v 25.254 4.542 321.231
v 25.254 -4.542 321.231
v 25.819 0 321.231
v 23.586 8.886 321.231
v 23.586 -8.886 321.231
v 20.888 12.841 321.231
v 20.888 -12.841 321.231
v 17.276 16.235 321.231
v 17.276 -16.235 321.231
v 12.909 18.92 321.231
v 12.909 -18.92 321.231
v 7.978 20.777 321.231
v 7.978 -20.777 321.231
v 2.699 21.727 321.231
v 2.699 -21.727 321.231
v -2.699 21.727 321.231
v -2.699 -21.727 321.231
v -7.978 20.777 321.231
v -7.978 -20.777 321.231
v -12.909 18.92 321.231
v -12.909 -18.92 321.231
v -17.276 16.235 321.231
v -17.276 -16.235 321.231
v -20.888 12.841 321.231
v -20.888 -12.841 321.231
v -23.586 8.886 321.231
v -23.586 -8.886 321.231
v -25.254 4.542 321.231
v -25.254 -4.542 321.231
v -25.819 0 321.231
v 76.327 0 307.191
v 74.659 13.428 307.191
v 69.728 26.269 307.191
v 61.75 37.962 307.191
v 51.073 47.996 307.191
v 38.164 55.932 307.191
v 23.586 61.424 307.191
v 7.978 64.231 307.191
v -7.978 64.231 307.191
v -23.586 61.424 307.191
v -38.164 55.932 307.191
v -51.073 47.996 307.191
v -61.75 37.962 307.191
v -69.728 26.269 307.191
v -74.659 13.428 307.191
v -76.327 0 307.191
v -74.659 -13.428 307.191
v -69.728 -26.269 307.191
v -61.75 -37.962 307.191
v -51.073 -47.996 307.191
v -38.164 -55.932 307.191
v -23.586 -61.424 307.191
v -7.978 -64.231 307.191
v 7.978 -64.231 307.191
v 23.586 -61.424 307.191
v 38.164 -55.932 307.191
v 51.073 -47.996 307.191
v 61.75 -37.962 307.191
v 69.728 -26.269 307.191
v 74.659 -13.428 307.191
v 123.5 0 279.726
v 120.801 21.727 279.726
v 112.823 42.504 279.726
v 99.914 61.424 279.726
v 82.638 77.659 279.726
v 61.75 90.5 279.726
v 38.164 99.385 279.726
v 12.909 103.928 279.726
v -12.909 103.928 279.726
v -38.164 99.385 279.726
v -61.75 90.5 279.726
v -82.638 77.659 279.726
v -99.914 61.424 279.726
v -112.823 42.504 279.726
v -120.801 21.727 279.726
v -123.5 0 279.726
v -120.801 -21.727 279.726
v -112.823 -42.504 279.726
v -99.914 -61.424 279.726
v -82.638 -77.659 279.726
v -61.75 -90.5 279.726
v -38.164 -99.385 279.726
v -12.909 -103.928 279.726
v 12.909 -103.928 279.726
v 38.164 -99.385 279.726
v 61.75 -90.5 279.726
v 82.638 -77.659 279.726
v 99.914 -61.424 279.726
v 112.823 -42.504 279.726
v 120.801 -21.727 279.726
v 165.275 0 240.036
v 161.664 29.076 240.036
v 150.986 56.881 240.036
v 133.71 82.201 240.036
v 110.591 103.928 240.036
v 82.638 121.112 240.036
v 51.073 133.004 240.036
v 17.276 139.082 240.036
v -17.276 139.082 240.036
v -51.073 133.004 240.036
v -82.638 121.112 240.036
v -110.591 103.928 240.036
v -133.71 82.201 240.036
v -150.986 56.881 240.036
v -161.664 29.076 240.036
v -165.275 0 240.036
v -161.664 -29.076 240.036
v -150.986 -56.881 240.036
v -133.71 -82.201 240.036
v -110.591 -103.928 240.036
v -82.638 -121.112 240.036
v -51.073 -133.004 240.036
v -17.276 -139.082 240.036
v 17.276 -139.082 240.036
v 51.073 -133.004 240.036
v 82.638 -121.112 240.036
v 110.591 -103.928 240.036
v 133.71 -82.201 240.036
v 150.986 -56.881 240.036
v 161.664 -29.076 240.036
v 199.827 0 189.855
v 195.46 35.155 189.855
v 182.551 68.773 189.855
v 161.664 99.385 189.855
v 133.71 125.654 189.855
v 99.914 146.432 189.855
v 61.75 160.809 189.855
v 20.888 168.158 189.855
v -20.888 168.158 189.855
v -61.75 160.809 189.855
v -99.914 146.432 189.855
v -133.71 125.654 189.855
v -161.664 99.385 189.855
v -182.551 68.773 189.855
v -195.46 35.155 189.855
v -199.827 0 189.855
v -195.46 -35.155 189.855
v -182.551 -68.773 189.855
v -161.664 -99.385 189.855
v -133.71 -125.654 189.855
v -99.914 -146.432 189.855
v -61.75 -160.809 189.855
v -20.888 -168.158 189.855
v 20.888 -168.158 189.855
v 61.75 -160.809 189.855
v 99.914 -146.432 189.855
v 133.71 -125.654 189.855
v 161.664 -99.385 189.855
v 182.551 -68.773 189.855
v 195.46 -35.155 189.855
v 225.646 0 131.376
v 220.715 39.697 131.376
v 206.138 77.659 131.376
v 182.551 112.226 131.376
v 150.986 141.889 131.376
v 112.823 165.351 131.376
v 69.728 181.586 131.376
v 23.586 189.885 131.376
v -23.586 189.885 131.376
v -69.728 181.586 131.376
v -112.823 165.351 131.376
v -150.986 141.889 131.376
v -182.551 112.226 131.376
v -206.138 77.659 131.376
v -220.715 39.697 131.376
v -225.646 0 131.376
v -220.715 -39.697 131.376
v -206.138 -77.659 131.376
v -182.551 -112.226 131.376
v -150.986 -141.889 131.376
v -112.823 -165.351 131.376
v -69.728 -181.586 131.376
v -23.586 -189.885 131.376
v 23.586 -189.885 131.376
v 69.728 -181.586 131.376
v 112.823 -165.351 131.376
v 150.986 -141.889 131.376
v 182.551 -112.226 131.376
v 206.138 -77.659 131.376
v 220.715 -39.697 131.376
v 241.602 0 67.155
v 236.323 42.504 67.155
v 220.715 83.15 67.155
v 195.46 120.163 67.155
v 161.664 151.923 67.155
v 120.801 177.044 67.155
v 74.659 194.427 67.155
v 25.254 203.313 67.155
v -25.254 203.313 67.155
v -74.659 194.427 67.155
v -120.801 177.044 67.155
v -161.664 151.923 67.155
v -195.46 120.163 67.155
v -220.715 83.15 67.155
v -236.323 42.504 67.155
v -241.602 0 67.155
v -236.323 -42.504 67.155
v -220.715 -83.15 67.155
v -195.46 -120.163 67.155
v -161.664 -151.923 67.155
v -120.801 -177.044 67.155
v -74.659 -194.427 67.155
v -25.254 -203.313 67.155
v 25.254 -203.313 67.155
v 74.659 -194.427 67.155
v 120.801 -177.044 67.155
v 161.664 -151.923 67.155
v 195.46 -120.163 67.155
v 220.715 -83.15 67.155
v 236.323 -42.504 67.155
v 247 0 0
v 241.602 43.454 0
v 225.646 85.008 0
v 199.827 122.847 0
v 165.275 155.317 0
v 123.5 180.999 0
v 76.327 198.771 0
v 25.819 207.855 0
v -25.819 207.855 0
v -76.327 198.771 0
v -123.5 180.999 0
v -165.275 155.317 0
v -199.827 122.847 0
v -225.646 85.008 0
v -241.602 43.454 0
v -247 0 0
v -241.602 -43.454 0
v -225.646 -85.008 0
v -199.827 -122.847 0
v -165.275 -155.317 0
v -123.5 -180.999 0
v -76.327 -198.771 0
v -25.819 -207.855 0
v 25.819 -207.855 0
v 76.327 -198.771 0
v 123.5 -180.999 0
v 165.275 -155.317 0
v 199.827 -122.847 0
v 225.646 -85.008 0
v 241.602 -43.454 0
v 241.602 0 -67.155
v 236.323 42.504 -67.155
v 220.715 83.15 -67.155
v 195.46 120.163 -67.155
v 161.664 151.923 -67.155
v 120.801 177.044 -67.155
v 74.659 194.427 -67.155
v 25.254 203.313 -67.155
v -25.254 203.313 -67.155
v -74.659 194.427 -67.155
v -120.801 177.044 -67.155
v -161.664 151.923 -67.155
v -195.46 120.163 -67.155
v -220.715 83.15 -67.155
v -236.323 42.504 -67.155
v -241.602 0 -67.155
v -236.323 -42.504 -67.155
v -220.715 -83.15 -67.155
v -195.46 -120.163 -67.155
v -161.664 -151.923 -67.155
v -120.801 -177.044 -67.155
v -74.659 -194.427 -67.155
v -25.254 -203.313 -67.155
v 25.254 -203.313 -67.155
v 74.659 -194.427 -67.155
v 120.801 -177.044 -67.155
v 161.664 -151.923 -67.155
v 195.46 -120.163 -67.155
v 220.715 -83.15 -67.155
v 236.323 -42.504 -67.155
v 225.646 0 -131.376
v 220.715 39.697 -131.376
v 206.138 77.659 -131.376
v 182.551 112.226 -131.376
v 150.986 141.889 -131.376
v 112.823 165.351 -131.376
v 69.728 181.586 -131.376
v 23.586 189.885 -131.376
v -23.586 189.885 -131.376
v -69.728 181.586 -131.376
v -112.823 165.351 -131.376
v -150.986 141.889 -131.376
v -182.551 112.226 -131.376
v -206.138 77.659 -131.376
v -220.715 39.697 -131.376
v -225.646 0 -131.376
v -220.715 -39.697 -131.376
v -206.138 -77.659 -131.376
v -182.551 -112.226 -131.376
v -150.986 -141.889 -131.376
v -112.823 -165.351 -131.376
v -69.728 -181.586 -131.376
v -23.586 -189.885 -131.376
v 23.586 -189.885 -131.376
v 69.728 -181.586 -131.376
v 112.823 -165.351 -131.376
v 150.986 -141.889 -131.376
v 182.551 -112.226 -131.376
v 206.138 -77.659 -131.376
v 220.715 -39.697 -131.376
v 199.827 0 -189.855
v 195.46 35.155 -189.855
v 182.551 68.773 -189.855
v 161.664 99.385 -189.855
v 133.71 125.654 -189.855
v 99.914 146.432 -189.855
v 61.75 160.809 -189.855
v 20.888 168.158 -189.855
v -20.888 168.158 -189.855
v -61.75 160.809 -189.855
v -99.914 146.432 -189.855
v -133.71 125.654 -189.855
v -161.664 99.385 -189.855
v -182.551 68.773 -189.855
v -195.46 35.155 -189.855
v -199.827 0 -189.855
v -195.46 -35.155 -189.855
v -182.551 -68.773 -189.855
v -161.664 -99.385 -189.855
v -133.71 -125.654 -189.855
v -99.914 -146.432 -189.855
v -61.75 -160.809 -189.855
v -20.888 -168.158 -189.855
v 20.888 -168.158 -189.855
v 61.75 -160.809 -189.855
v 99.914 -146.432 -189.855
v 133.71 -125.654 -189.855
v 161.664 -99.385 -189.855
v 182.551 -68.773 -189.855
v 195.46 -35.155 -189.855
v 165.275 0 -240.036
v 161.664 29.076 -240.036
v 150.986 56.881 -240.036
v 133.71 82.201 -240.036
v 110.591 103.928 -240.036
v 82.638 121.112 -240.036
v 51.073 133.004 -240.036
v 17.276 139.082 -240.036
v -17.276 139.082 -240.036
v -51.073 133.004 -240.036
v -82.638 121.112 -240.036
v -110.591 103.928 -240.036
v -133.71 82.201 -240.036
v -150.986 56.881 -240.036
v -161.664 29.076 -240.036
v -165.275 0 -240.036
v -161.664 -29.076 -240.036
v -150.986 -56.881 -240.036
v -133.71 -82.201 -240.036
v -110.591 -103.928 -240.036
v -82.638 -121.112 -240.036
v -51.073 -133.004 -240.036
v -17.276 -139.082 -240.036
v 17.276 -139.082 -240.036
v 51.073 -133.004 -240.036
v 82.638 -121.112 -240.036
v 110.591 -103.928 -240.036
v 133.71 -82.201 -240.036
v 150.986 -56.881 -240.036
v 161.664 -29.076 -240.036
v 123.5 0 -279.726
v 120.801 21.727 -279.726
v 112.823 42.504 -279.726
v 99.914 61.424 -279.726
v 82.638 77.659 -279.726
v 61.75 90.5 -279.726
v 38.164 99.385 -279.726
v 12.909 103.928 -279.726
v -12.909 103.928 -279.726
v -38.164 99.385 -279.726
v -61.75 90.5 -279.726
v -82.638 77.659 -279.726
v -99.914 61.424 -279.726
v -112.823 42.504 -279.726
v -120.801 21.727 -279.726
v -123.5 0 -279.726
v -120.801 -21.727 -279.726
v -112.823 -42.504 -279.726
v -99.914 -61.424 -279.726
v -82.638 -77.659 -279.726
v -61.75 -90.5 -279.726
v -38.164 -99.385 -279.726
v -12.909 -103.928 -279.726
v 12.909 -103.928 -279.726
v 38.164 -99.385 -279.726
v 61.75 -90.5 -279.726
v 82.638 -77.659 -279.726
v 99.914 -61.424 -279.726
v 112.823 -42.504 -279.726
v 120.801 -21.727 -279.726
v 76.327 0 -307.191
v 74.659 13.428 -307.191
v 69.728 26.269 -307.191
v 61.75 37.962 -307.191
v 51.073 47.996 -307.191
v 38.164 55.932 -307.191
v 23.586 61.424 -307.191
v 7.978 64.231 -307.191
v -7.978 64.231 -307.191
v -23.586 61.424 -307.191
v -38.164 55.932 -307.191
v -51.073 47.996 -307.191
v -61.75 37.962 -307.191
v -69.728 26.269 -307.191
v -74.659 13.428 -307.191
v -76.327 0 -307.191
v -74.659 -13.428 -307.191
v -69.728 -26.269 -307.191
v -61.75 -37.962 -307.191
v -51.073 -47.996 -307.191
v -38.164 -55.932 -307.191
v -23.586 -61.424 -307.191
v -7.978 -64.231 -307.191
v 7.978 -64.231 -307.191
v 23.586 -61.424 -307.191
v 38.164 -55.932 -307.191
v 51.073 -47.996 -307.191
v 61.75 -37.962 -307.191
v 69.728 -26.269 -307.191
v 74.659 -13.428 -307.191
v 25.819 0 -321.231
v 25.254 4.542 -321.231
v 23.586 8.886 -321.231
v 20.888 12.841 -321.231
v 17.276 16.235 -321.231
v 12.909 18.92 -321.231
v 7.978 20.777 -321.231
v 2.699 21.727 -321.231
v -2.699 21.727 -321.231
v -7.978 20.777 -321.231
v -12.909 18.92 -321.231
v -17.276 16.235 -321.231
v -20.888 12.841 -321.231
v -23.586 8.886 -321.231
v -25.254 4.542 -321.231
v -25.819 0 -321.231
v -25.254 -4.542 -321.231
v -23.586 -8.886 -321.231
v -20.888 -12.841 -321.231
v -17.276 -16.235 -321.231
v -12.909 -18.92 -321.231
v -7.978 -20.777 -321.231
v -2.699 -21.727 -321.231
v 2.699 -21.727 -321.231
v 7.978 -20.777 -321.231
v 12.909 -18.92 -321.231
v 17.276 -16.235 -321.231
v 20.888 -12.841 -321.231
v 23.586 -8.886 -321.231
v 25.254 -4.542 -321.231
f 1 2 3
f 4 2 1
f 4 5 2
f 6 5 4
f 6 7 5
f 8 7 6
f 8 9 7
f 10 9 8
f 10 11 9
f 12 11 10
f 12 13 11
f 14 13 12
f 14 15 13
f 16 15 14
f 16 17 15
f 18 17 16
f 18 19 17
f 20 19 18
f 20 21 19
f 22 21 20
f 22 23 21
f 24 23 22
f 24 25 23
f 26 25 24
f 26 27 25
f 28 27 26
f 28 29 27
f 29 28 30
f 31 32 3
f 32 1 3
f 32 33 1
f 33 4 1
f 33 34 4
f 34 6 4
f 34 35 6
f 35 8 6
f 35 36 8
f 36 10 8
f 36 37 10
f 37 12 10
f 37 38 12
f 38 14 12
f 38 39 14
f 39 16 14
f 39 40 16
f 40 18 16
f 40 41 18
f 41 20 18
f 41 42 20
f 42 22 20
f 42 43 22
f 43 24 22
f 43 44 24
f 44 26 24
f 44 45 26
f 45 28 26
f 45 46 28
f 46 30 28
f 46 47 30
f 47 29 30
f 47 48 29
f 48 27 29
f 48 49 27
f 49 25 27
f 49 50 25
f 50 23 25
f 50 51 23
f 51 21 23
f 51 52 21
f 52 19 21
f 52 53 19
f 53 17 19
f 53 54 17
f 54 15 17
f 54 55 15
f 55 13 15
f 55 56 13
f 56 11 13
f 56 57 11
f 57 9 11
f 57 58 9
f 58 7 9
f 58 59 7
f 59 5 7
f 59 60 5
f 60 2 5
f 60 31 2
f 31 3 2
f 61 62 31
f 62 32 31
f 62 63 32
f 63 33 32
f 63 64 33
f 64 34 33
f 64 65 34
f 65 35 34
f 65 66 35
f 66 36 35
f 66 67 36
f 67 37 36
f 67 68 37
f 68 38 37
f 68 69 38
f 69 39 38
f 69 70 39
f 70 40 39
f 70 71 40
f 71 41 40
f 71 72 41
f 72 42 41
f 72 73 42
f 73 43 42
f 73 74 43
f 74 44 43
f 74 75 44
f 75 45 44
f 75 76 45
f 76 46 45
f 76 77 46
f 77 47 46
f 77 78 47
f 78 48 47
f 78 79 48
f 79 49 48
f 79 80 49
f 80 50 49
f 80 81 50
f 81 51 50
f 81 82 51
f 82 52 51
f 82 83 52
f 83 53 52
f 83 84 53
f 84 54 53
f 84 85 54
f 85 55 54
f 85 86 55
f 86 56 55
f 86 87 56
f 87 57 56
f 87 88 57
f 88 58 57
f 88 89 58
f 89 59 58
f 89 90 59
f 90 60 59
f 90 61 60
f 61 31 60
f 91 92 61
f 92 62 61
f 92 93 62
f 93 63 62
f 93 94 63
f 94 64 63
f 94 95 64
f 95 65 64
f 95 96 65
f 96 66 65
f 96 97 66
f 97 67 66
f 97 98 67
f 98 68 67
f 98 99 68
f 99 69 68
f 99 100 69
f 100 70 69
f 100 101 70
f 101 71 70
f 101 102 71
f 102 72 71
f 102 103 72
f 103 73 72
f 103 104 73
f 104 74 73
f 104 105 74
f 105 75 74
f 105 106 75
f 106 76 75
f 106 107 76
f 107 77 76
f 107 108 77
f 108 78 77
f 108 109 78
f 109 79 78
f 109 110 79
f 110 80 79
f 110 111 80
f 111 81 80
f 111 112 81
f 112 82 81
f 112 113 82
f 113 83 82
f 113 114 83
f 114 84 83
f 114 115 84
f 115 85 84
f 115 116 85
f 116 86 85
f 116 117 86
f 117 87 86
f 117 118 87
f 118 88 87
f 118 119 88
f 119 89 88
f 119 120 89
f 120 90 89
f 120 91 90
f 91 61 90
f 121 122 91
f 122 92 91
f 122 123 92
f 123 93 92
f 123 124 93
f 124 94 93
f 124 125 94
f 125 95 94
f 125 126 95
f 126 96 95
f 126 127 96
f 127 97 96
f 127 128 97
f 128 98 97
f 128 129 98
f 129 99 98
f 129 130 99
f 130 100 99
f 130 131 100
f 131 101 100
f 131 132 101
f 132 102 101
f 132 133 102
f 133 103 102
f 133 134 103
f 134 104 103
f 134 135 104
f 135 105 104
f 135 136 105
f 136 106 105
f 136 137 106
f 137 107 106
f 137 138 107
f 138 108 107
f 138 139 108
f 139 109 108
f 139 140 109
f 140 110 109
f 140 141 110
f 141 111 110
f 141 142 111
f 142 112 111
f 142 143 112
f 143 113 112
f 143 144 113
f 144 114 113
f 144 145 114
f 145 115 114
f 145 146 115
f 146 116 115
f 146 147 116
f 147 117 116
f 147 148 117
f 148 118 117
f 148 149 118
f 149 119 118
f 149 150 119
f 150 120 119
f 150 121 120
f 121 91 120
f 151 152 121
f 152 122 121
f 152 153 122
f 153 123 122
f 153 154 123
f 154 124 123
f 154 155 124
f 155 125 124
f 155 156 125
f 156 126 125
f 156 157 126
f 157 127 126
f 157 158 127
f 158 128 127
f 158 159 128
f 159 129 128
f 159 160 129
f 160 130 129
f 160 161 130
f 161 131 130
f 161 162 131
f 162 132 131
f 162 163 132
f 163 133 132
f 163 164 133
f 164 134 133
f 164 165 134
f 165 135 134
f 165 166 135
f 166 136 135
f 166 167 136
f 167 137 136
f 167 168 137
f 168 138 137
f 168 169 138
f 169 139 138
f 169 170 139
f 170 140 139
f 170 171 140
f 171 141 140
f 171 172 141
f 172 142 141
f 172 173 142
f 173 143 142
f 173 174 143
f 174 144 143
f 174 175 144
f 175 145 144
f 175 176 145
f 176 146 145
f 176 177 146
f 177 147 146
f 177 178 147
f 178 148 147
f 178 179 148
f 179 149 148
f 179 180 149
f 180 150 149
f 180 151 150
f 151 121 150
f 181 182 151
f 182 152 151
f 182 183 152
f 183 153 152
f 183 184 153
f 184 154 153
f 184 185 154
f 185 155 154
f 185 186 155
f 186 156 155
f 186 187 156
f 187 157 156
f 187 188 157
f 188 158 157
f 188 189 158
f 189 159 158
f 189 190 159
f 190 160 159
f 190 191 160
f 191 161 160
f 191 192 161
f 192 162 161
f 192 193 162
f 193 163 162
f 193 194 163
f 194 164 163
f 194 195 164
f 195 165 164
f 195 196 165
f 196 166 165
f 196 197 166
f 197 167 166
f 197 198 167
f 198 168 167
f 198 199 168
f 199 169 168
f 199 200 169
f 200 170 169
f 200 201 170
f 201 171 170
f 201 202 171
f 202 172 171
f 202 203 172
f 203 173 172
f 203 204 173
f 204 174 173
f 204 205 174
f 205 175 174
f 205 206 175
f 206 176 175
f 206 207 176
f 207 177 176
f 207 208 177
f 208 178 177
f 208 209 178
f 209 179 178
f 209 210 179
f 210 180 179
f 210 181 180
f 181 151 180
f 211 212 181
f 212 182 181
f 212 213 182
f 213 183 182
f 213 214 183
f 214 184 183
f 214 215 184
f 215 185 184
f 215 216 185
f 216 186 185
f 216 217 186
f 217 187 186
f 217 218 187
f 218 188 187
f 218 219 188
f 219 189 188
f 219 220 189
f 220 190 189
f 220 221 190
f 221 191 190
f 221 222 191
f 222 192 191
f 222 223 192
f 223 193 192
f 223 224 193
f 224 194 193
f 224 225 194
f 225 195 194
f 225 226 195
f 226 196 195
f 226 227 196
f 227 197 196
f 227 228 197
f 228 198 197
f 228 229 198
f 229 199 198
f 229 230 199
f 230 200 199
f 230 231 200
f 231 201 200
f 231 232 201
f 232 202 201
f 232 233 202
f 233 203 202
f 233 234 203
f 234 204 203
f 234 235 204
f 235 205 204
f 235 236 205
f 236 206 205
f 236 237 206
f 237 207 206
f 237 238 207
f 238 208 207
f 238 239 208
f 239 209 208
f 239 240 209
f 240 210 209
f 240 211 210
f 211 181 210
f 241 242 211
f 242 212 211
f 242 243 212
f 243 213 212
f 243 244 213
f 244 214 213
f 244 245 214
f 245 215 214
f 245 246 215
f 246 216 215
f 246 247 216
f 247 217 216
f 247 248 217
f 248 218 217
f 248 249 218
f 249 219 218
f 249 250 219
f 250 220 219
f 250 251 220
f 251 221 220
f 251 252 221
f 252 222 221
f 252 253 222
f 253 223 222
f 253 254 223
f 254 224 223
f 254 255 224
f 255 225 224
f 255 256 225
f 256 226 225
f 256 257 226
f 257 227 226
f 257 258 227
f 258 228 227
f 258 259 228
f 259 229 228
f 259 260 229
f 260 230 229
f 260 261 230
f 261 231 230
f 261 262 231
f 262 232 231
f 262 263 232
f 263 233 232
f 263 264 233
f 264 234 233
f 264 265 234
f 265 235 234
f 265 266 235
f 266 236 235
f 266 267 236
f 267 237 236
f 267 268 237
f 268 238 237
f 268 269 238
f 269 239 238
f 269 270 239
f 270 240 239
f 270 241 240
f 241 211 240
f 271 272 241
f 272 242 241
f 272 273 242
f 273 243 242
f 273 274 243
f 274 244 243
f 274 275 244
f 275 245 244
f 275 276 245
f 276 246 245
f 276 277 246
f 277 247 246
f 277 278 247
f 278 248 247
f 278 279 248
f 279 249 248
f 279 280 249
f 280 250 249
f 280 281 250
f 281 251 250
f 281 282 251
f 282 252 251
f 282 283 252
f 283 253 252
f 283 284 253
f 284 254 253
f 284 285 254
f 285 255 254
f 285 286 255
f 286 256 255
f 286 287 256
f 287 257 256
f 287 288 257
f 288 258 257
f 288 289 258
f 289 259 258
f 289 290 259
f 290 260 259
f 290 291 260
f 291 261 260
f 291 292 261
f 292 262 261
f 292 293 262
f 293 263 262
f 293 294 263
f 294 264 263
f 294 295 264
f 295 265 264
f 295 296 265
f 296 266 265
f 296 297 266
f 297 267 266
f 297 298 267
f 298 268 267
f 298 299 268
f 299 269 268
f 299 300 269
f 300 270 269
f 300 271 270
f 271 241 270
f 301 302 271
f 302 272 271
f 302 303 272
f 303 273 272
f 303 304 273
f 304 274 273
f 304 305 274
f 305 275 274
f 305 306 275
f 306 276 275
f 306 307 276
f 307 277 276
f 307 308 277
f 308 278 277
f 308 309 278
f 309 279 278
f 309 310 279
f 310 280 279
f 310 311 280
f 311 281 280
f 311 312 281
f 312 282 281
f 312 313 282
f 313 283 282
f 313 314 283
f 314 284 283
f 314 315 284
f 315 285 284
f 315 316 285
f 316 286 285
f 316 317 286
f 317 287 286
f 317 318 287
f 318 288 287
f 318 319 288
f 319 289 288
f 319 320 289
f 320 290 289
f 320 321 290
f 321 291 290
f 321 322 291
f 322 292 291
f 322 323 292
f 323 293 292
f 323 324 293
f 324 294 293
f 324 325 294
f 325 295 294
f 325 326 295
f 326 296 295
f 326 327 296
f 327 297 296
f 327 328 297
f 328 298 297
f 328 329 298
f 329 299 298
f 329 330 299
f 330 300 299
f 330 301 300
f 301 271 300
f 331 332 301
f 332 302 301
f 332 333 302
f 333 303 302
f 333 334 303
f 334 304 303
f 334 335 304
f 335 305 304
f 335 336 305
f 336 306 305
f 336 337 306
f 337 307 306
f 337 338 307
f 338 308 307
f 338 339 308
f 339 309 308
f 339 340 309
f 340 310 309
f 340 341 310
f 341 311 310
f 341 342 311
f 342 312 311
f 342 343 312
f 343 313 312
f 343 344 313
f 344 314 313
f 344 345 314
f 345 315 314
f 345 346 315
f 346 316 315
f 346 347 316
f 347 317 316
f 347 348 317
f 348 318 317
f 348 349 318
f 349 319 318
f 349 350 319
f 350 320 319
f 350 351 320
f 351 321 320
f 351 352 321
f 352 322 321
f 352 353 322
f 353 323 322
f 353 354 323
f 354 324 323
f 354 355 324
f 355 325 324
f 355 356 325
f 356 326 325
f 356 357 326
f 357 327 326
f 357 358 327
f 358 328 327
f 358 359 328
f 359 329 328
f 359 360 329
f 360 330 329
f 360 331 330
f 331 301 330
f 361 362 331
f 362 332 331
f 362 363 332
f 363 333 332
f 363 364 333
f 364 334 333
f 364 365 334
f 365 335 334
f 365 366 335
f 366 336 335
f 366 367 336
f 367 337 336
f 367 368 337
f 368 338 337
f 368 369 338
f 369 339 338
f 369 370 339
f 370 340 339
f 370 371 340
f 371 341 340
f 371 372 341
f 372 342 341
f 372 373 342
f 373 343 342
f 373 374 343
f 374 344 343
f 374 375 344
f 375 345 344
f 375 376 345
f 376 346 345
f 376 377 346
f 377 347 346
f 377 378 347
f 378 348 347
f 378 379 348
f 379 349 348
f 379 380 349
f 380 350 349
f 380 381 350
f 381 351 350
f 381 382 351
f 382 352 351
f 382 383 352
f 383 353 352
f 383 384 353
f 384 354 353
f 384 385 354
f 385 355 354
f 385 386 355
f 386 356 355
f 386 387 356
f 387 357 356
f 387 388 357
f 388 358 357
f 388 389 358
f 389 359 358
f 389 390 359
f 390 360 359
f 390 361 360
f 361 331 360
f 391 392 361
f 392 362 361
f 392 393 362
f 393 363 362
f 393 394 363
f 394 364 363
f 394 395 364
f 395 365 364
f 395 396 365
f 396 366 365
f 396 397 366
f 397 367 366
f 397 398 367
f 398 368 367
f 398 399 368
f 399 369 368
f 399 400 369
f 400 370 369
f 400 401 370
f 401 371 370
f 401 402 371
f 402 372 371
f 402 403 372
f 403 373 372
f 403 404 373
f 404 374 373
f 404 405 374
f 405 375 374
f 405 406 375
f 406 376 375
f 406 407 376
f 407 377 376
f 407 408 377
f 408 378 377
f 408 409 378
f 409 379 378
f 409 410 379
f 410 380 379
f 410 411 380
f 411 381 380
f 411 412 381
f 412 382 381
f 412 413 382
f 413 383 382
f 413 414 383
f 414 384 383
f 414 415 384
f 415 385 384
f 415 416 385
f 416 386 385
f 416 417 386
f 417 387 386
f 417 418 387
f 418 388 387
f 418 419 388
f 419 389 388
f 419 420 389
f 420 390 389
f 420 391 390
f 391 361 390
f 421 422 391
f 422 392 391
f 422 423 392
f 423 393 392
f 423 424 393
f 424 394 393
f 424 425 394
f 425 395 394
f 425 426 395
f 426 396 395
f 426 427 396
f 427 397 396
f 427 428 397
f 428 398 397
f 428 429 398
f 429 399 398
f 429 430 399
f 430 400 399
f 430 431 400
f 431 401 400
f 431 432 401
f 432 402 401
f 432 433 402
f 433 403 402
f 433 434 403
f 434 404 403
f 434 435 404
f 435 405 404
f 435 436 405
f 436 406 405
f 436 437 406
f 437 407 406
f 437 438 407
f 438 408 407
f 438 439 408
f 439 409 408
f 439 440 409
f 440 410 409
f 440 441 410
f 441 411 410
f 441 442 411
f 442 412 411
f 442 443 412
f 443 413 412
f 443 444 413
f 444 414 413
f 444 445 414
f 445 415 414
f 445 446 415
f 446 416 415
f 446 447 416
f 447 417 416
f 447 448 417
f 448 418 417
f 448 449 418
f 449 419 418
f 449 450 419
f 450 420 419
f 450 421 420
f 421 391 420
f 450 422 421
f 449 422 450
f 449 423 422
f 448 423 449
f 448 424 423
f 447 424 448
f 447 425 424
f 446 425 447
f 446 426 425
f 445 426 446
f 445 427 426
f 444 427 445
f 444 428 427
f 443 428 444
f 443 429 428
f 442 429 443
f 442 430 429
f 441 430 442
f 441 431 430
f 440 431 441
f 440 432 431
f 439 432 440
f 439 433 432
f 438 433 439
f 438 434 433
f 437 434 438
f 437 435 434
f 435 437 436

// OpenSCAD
// Generated by SolidPython 1.0.1 on 2020-07-29 00:46:51


scale(v = [13, 11, 17]) {
	sphere(r = 19);
}
/***********************************************
*********      SolidPython code:      **********
************************************************
 
# import packages: SolidPython
from solid import *
from solid.utils import *
from itertools import chain, combinations, permutations


class Resize:

    def __init__(self, scad_file):
        self.scad_file = scad_file
        #self.scad_file = import_scad(scad_file)
        # cone/cylinder param:
        self.r1 = 0
        self.r2 = 0
        self.h = 0
        # rectangular prism param:
        self.w = 0
        self.l = 0
        # ellipse param:
        self.r = 0

    # import OpenScad code (file name corresponds to shape)


    # classify shape + parameters
    def assign(self, param1, param2, param3):
        if self.scad_file == 'cone.scad':
            self.r1 = param1
            self.r2 = param2
            self.h = param3
        elif self.scad_file == 'cylinder.scad':
            self.r1 = param1
            self.r2 = param2
            self.h = param3
        elif self.scad_file == 'rectangularPrism.scad':
            self.h = param1
            self.l = param2
            self.w = param3
        else:
            self.r = param1
            self.h = param2

    # resize parameters
    def iterate(self):
        x = range(3, 20, 2)
        i = 1
        if self.scad_file == 'cone.scad':
            tempList = list(permutations(x, 2))
            for temp in tempList:
                param1 = temp[0]
                param2 = temp[1]
                filepath = 'produced_scad_files/' + 'cone' + str(param1) + '_' + str(param2) + '_' + '.scad'
                scad_render_to_file(cylinder(h=param1, r1=param2, r2=0), filepath)

        elif self.scad_file == 'cylinder.scad':
            tempList = list(permutations(x, 3))
            for temp in tempList:
                param1 = temp[0]
                param2 = temp[1]
                filepath = 'produced_scad_files/' + 'cylinder' + str(param1) + '_' + str(param2) + '_' + '.scad'
                scad_render_to_file(cylinder(h=param1, r1=param2, r2=param2), filepath)

        elif self.scad_file == 'rectangularPrism.scad':
            tempList = list(permutations(x, 3))
            for temp in tempList:
                param1 = temp[0]
                param2 = temp[1]
                param3 = temp[2]
                filepath = 'produced_scad_files/' + 'rectangularPrism' + str(param1) + '_' + str(param2) + '_' + str(
                    param3) + '.scad'
                scad_render_to_file(cube(size=(param1, param2, param3)), filepath)

        elif self.scad_file == 'ellipse.scad':
            tempList = list(permutations(x, 4))
            for temp in tempList:
                param1 = temp[0]
                param2 = temp[1]
                param3 = temp[2]
                param4 = temp[3]
                filepath = 'produced_scad_files/' + 'ellipse' + str(param1) + '_' + str(param2) + '_' + str(param3) + '_' + str(param4) + '.scad'
                scad_render_to_file(scale([param1, param2, param3])(sphere(r=param4)), filepath)

    def render_to_scadfile(self):
        scad_render_to_file(scad, 'example.scad') 
 
************************************************/
